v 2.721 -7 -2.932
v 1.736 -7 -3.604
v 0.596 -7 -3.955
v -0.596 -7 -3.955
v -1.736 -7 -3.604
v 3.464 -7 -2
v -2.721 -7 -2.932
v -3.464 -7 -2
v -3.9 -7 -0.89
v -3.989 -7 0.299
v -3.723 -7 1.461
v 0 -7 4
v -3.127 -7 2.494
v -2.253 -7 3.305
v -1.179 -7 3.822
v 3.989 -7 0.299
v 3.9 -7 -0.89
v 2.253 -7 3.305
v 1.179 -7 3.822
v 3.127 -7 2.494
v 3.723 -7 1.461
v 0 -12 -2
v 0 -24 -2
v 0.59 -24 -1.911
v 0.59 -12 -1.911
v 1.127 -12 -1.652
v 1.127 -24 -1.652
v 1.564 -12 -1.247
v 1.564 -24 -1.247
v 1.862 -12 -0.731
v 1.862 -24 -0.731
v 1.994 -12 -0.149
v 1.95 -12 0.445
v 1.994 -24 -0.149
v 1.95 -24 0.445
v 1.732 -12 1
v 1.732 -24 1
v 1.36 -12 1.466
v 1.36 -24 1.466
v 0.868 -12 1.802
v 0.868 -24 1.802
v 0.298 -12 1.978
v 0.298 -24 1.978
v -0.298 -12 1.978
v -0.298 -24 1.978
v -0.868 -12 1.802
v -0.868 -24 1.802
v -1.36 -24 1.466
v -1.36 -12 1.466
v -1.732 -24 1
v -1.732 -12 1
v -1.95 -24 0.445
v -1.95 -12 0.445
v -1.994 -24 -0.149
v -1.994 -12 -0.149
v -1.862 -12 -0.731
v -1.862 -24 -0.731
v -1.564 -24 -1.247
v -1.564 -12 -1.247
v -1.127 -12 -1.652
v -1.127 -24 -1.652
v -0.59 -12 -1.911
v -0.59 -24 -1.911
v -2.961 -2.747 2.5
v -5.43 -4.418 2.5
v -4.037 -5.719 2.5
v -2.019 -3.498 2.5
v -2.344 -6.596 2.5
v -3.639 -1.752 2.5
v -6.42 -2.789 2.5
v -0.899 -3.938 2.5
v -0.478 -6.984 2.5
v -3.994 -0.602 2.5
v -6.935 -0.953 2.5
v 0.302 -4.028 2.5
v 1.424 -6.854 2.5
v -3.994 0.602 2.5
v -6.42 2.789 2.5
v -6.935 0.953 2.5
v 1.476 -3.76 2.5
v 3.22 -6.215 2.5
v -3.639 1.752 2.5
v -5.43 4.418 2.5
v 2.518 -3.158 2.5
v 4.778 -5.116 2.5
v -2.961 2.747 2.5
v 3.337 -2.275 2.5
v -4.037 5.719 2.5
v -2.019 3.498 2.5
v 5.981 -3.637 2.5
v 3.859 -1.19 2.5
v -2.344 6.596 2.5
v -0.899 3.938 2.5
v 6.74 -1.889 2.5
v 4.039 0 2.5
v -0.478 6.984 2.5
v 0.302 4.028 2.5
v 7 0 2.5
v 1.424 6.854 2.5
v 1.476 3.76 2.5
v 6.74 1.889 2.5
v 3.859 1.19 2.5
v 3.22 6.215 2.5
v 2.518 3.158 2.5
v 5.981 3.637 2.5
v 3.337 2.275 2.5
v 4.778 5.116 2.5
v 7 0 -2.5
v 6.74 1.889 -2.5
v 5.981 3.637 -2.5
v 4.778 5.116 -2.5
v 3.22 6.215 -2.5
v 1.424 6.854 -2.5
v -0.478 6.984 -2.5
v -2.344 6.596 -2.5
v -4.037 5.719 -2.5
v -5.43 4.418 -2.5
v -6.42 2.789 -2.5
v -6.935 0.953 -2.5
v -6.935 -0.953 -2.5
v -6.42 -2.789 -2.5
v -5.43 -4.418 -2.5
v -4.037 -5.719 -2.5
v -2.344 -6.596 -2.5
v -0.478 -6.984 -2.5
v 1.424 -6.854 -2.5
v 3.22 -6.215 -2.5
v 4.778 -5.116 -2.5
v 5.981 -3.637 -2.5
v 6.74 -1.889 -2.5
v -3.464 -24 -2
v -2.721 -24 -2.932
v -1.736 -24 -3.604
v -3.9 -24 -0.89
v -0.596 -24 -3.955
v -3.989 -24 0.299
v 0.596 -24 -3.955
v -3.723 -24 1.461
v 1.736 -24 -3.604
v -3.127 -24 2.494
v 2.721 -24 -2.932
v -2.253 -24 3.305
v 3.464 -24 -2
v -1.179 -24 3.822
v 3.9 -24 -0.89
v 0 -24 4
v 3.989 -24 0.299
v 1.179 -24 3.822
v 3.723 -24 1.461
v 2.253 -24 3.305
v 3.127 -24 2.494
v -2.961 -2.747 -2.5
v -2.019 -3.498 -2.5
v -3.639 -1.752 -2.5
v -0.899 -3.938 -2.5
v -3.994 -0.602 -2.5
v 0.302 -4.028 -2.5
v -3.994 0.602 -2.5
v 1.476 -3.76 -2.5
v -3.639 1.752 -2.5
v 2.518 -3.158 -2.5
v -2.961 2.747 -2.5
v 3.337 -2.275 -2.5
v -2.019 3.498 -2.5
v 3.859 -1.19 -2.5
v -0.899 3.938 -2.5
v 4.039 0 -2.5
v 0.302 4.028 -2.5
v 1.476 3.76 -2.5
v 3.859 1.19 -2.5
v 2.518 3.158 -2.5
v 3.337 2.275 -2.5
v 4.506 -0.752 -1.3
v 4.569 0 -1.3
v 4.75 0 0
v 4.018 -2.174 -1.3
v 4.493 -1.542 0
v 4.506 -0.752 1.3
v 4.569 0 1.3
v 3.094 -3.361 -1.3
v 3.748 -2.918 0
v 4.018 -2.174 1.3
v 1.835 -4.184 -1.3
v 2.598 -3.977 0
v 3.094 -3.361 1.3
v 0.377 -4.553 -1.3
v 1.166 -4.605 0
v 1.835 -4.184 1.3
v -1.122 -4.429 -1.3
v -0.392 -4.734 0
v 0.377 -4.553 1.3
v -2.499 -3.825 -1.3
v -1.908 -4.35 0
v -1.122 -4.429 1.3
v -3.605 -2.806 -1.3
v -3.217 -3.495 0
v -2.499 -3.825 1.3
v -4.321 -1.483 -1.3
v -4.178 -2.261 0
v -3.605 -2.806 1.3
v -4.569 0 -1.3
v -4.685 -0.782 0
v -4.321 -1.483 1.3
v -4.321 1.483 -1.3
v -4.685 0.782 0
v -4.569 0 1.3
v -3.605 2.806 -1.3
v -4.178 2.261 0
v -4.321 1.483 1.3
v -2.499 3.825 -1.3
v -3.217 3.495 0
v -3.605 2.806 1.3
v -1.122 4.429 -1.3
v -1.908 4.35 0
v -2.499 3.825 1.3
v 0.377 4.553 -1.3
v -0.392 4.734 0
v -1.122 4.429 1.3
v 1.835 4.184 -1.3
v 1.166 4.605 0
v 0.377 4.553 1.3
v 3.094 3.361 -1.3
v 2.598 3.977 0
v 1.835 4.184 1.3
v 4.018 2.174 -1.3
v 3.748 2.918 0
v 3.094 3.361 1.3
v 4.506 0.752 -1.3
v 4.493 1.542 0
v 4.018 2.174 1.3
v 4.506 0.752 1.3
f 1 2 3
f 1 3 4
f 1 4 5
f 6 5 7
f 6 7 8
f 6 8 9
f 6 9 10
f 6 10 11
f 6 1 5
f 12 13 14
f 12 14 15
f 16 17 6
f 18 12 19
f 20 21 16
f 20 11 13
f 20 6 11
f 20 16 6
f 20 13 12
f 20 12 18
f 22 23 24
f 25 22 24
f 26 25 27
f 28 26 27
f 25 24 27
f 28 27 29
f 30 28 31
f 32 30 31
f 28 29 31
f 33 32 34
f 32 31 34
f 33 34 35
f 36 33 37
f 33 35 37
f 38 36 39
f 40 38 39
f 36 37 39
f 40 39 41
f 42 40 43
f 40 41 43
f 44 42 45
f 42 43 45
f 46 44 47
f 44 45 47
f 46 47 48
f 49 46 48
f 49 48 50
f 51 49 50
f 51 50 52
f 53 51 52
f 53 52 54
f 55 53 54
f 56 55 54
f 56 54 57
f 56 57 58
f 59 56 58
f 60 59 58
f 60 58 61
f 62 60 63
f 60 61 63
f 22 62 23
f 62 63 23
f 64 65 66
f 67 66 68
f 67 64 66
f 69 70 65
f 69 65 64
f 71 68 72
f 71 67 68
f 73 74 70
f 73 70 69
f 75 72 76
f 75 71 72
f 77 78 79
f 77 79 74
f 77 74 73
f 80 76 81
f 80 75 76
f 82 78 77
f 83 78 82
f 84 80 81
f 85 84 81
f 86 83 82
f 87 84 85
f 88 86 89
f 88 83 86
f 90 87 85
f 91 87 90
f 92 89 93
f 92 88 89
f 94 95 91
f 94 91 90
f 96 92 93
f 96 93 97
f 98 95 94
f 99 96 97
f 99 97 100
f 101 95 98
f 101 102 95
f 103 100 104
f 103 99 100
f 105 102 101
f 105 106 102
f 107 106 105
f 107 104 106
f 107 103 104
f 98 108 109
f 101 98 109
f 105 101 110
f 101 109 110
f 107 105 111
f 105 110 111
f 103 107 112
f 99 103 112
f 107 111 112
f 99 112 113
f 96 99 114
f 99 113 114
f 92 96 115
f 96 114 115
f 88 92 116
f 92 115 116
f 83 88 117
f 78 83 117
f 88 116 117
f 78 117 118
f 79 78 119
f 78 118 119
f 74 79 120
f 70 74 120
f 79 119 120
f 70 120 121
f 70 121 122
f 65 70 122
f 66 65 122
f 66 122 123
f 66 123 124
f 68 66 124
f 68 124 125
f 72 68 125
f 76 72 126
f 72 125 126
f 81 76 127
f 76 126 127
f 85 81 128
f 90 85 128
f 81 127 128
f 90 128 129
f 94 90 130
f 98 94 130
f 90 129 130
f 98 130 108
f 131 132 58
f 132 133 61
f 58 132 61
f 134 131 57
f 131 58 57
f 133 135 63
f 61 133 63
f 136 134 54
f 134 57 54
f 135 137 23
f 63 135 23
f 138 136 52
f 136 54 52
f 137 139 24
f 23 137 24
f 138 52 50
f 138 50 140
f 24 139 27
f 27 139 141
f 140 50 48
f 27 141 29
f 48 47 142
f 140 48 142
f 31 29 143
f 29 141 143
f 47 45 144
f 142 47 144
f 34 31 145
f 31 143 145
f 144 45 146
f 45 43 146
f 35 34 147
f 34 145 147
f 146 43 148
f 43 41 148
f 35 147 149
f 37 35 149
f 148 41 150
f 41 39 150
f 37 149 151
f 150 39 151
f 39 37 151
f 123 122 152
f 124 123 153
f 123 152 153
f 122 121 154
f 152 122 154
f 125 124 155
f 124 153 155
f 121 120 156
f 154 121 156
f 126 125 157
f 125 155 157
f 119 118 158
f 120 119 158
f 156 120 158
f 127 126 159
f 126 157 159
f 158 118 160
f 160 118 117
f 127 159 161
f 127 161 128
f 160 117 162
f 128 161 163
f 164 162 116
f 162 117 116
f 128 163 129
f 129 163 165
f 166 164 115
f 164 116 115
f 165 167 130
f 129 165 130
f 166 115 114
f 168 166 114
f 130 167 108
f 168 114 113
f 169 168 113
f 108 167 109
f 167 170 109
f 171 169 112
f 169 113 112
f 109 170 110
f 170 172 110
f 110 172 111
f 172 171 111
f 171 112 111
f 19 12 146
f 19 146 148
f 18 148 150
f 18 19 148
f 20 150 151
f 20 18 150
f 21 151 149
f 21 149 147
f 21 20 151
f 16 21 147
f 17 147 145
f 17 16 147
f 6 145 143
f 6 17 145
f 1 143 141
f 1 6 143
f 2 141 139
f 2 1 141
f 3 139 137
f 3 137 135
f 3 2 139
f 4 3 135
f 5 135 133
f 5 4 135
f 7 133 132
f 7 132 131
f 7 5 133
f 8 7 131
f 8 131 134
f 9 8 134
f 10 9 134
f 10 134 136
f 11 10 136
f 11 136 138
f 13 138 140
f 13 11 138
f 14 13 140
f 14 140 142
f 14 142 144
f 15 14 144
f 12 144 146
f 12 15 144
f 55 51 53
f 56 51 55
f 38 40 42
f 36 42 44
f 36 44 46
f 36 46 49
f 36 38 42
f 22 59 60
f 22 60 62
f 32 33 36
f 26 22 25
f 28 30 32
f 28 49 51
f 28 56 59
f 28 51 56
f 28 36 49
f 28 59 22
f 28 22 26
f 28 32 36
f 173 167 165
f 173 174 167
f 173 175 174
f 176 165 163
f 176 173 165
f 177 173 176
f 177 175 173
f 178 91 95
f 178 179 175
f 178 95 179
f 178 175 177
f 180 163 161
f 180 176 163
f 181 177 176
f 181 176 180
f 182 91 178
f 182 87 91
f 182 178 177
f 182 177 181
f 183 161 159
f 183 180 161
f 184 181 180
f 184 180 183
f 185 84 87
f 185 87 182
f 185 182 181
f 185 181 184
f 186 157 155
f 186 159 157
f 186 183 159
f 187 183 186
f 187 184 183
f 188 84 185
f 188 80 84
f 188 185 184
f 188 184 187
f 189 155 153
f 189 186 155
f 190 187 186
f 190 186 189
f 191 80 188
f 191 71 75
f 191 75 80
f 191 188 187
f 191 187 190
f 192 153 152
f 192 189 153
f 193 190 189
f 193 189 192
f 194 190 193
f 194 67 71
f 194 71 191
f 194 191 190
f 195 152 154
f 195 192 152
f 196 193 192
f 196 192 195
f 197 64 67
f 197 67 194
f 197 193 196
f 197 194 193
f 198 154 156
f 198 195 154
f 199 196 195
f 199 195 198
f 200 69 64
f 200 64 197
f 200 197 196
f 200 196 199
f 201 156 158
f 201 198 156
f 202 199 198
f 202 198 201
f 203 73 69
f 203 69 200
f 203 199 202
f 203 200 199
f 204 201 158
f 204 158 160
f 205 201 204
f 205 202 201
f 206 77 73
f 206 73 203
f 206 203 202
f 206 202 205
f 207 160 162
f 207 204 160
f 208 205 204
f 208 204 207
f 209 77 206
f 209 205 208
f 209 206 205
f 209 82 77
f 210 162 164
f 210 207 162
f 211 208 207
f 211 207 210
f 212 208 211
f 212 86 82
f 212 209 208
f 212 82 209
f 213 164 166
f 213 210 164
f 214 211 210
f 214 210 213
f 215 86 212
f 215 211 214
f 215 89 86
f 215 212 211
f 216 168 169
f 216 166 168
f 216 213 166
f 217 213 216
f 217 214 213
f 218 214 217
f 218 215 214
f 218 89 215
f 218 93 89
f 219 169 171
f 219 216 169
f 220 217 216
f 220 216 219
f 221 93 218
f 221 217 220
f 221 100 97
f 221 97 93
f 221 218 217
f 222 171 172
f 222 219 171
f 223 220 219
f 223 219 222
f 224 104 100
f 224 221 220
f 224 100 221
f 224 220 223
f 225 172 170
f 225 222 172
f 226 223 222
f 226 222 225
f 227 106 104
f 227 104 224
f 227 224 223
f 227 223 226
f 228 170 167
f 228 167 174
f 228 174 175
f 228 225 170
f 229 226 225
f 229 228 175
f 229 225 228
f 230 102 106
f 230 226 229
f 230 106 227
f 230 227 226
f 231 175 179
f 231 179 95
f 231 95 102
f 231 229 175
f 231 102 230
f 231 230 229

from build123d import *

# Parameters (mm, degrees)
EXTRUDE_1_DEPTH       = 2.5
EXTRUDE_1_DEPTH_BACK  = 2.5
SKETCH_1_R            = 7
SKETCH_4_R            = 4
EXTRUDE_480_DEPTH     = 17
SKETCH_5_R            = 2
CUT_EXTRUDE_557_DEPTH = 12


with BuildPart() as part:
    # Эскиз1 → Бобышка-Вытянуть1 (new, two sides: drawn at the far end of the back side and taken through both)
    with BuildSketch(Plane.XY.offset(-EXTRUDE_1_DEPTH_BACK)):
        Circle(SKETCH_1_R)
    extrude(amount=EXTRUDE_1_DEPTH + EXTRUDE_1_DEPTH_BACK)

    # Эскиз8 → Cut-Revolve 690 (revolve, cut)
    with BuildSketch(Plane(origin=(0, 0, 0), x_dir=(0, 0, -1), z_dir=(1, 0, 0))):
        with BuildLine():
            Line((-3.5, 0), (3.5, 0))
            Line((3.5, 0), (3.5, 3.211308145))
            ThreePointArc((3.5, 3.211308145), (0, 4.75), (-3.5, 3.211308145))
            Line((-3.5, 3.211308145), (-3.5, 0))
        make_face()
    revolve(axis=Axis((0, 0, 3.5), (0, 0, -1)), mode=Mode.SUBTRACT)


with BuildPart() as body_2:
    # Эскиз4 → Extrude 480 (new body)
    with BuildSketch(Plane(origin=(0, -7, 0), x_dir=(1, 0, 0), z_dir=(0, 1, 0))):
        Circle(SKETCH_4_R)
    extrude(amount=-EXTRUDE_480_DEPTH)

    # Эскиз5 → Cut-Extrude 557 (cut)
    with BuildSketch(Plane.XZ.offset(24)):
        Circle(SKETCH_5_R)
    extrude(amount=-CUT_EXTRUDE_557_DEPTH, mode=Mode.SUBTRACT)


solid = Compound([part.part, body_2.part])
